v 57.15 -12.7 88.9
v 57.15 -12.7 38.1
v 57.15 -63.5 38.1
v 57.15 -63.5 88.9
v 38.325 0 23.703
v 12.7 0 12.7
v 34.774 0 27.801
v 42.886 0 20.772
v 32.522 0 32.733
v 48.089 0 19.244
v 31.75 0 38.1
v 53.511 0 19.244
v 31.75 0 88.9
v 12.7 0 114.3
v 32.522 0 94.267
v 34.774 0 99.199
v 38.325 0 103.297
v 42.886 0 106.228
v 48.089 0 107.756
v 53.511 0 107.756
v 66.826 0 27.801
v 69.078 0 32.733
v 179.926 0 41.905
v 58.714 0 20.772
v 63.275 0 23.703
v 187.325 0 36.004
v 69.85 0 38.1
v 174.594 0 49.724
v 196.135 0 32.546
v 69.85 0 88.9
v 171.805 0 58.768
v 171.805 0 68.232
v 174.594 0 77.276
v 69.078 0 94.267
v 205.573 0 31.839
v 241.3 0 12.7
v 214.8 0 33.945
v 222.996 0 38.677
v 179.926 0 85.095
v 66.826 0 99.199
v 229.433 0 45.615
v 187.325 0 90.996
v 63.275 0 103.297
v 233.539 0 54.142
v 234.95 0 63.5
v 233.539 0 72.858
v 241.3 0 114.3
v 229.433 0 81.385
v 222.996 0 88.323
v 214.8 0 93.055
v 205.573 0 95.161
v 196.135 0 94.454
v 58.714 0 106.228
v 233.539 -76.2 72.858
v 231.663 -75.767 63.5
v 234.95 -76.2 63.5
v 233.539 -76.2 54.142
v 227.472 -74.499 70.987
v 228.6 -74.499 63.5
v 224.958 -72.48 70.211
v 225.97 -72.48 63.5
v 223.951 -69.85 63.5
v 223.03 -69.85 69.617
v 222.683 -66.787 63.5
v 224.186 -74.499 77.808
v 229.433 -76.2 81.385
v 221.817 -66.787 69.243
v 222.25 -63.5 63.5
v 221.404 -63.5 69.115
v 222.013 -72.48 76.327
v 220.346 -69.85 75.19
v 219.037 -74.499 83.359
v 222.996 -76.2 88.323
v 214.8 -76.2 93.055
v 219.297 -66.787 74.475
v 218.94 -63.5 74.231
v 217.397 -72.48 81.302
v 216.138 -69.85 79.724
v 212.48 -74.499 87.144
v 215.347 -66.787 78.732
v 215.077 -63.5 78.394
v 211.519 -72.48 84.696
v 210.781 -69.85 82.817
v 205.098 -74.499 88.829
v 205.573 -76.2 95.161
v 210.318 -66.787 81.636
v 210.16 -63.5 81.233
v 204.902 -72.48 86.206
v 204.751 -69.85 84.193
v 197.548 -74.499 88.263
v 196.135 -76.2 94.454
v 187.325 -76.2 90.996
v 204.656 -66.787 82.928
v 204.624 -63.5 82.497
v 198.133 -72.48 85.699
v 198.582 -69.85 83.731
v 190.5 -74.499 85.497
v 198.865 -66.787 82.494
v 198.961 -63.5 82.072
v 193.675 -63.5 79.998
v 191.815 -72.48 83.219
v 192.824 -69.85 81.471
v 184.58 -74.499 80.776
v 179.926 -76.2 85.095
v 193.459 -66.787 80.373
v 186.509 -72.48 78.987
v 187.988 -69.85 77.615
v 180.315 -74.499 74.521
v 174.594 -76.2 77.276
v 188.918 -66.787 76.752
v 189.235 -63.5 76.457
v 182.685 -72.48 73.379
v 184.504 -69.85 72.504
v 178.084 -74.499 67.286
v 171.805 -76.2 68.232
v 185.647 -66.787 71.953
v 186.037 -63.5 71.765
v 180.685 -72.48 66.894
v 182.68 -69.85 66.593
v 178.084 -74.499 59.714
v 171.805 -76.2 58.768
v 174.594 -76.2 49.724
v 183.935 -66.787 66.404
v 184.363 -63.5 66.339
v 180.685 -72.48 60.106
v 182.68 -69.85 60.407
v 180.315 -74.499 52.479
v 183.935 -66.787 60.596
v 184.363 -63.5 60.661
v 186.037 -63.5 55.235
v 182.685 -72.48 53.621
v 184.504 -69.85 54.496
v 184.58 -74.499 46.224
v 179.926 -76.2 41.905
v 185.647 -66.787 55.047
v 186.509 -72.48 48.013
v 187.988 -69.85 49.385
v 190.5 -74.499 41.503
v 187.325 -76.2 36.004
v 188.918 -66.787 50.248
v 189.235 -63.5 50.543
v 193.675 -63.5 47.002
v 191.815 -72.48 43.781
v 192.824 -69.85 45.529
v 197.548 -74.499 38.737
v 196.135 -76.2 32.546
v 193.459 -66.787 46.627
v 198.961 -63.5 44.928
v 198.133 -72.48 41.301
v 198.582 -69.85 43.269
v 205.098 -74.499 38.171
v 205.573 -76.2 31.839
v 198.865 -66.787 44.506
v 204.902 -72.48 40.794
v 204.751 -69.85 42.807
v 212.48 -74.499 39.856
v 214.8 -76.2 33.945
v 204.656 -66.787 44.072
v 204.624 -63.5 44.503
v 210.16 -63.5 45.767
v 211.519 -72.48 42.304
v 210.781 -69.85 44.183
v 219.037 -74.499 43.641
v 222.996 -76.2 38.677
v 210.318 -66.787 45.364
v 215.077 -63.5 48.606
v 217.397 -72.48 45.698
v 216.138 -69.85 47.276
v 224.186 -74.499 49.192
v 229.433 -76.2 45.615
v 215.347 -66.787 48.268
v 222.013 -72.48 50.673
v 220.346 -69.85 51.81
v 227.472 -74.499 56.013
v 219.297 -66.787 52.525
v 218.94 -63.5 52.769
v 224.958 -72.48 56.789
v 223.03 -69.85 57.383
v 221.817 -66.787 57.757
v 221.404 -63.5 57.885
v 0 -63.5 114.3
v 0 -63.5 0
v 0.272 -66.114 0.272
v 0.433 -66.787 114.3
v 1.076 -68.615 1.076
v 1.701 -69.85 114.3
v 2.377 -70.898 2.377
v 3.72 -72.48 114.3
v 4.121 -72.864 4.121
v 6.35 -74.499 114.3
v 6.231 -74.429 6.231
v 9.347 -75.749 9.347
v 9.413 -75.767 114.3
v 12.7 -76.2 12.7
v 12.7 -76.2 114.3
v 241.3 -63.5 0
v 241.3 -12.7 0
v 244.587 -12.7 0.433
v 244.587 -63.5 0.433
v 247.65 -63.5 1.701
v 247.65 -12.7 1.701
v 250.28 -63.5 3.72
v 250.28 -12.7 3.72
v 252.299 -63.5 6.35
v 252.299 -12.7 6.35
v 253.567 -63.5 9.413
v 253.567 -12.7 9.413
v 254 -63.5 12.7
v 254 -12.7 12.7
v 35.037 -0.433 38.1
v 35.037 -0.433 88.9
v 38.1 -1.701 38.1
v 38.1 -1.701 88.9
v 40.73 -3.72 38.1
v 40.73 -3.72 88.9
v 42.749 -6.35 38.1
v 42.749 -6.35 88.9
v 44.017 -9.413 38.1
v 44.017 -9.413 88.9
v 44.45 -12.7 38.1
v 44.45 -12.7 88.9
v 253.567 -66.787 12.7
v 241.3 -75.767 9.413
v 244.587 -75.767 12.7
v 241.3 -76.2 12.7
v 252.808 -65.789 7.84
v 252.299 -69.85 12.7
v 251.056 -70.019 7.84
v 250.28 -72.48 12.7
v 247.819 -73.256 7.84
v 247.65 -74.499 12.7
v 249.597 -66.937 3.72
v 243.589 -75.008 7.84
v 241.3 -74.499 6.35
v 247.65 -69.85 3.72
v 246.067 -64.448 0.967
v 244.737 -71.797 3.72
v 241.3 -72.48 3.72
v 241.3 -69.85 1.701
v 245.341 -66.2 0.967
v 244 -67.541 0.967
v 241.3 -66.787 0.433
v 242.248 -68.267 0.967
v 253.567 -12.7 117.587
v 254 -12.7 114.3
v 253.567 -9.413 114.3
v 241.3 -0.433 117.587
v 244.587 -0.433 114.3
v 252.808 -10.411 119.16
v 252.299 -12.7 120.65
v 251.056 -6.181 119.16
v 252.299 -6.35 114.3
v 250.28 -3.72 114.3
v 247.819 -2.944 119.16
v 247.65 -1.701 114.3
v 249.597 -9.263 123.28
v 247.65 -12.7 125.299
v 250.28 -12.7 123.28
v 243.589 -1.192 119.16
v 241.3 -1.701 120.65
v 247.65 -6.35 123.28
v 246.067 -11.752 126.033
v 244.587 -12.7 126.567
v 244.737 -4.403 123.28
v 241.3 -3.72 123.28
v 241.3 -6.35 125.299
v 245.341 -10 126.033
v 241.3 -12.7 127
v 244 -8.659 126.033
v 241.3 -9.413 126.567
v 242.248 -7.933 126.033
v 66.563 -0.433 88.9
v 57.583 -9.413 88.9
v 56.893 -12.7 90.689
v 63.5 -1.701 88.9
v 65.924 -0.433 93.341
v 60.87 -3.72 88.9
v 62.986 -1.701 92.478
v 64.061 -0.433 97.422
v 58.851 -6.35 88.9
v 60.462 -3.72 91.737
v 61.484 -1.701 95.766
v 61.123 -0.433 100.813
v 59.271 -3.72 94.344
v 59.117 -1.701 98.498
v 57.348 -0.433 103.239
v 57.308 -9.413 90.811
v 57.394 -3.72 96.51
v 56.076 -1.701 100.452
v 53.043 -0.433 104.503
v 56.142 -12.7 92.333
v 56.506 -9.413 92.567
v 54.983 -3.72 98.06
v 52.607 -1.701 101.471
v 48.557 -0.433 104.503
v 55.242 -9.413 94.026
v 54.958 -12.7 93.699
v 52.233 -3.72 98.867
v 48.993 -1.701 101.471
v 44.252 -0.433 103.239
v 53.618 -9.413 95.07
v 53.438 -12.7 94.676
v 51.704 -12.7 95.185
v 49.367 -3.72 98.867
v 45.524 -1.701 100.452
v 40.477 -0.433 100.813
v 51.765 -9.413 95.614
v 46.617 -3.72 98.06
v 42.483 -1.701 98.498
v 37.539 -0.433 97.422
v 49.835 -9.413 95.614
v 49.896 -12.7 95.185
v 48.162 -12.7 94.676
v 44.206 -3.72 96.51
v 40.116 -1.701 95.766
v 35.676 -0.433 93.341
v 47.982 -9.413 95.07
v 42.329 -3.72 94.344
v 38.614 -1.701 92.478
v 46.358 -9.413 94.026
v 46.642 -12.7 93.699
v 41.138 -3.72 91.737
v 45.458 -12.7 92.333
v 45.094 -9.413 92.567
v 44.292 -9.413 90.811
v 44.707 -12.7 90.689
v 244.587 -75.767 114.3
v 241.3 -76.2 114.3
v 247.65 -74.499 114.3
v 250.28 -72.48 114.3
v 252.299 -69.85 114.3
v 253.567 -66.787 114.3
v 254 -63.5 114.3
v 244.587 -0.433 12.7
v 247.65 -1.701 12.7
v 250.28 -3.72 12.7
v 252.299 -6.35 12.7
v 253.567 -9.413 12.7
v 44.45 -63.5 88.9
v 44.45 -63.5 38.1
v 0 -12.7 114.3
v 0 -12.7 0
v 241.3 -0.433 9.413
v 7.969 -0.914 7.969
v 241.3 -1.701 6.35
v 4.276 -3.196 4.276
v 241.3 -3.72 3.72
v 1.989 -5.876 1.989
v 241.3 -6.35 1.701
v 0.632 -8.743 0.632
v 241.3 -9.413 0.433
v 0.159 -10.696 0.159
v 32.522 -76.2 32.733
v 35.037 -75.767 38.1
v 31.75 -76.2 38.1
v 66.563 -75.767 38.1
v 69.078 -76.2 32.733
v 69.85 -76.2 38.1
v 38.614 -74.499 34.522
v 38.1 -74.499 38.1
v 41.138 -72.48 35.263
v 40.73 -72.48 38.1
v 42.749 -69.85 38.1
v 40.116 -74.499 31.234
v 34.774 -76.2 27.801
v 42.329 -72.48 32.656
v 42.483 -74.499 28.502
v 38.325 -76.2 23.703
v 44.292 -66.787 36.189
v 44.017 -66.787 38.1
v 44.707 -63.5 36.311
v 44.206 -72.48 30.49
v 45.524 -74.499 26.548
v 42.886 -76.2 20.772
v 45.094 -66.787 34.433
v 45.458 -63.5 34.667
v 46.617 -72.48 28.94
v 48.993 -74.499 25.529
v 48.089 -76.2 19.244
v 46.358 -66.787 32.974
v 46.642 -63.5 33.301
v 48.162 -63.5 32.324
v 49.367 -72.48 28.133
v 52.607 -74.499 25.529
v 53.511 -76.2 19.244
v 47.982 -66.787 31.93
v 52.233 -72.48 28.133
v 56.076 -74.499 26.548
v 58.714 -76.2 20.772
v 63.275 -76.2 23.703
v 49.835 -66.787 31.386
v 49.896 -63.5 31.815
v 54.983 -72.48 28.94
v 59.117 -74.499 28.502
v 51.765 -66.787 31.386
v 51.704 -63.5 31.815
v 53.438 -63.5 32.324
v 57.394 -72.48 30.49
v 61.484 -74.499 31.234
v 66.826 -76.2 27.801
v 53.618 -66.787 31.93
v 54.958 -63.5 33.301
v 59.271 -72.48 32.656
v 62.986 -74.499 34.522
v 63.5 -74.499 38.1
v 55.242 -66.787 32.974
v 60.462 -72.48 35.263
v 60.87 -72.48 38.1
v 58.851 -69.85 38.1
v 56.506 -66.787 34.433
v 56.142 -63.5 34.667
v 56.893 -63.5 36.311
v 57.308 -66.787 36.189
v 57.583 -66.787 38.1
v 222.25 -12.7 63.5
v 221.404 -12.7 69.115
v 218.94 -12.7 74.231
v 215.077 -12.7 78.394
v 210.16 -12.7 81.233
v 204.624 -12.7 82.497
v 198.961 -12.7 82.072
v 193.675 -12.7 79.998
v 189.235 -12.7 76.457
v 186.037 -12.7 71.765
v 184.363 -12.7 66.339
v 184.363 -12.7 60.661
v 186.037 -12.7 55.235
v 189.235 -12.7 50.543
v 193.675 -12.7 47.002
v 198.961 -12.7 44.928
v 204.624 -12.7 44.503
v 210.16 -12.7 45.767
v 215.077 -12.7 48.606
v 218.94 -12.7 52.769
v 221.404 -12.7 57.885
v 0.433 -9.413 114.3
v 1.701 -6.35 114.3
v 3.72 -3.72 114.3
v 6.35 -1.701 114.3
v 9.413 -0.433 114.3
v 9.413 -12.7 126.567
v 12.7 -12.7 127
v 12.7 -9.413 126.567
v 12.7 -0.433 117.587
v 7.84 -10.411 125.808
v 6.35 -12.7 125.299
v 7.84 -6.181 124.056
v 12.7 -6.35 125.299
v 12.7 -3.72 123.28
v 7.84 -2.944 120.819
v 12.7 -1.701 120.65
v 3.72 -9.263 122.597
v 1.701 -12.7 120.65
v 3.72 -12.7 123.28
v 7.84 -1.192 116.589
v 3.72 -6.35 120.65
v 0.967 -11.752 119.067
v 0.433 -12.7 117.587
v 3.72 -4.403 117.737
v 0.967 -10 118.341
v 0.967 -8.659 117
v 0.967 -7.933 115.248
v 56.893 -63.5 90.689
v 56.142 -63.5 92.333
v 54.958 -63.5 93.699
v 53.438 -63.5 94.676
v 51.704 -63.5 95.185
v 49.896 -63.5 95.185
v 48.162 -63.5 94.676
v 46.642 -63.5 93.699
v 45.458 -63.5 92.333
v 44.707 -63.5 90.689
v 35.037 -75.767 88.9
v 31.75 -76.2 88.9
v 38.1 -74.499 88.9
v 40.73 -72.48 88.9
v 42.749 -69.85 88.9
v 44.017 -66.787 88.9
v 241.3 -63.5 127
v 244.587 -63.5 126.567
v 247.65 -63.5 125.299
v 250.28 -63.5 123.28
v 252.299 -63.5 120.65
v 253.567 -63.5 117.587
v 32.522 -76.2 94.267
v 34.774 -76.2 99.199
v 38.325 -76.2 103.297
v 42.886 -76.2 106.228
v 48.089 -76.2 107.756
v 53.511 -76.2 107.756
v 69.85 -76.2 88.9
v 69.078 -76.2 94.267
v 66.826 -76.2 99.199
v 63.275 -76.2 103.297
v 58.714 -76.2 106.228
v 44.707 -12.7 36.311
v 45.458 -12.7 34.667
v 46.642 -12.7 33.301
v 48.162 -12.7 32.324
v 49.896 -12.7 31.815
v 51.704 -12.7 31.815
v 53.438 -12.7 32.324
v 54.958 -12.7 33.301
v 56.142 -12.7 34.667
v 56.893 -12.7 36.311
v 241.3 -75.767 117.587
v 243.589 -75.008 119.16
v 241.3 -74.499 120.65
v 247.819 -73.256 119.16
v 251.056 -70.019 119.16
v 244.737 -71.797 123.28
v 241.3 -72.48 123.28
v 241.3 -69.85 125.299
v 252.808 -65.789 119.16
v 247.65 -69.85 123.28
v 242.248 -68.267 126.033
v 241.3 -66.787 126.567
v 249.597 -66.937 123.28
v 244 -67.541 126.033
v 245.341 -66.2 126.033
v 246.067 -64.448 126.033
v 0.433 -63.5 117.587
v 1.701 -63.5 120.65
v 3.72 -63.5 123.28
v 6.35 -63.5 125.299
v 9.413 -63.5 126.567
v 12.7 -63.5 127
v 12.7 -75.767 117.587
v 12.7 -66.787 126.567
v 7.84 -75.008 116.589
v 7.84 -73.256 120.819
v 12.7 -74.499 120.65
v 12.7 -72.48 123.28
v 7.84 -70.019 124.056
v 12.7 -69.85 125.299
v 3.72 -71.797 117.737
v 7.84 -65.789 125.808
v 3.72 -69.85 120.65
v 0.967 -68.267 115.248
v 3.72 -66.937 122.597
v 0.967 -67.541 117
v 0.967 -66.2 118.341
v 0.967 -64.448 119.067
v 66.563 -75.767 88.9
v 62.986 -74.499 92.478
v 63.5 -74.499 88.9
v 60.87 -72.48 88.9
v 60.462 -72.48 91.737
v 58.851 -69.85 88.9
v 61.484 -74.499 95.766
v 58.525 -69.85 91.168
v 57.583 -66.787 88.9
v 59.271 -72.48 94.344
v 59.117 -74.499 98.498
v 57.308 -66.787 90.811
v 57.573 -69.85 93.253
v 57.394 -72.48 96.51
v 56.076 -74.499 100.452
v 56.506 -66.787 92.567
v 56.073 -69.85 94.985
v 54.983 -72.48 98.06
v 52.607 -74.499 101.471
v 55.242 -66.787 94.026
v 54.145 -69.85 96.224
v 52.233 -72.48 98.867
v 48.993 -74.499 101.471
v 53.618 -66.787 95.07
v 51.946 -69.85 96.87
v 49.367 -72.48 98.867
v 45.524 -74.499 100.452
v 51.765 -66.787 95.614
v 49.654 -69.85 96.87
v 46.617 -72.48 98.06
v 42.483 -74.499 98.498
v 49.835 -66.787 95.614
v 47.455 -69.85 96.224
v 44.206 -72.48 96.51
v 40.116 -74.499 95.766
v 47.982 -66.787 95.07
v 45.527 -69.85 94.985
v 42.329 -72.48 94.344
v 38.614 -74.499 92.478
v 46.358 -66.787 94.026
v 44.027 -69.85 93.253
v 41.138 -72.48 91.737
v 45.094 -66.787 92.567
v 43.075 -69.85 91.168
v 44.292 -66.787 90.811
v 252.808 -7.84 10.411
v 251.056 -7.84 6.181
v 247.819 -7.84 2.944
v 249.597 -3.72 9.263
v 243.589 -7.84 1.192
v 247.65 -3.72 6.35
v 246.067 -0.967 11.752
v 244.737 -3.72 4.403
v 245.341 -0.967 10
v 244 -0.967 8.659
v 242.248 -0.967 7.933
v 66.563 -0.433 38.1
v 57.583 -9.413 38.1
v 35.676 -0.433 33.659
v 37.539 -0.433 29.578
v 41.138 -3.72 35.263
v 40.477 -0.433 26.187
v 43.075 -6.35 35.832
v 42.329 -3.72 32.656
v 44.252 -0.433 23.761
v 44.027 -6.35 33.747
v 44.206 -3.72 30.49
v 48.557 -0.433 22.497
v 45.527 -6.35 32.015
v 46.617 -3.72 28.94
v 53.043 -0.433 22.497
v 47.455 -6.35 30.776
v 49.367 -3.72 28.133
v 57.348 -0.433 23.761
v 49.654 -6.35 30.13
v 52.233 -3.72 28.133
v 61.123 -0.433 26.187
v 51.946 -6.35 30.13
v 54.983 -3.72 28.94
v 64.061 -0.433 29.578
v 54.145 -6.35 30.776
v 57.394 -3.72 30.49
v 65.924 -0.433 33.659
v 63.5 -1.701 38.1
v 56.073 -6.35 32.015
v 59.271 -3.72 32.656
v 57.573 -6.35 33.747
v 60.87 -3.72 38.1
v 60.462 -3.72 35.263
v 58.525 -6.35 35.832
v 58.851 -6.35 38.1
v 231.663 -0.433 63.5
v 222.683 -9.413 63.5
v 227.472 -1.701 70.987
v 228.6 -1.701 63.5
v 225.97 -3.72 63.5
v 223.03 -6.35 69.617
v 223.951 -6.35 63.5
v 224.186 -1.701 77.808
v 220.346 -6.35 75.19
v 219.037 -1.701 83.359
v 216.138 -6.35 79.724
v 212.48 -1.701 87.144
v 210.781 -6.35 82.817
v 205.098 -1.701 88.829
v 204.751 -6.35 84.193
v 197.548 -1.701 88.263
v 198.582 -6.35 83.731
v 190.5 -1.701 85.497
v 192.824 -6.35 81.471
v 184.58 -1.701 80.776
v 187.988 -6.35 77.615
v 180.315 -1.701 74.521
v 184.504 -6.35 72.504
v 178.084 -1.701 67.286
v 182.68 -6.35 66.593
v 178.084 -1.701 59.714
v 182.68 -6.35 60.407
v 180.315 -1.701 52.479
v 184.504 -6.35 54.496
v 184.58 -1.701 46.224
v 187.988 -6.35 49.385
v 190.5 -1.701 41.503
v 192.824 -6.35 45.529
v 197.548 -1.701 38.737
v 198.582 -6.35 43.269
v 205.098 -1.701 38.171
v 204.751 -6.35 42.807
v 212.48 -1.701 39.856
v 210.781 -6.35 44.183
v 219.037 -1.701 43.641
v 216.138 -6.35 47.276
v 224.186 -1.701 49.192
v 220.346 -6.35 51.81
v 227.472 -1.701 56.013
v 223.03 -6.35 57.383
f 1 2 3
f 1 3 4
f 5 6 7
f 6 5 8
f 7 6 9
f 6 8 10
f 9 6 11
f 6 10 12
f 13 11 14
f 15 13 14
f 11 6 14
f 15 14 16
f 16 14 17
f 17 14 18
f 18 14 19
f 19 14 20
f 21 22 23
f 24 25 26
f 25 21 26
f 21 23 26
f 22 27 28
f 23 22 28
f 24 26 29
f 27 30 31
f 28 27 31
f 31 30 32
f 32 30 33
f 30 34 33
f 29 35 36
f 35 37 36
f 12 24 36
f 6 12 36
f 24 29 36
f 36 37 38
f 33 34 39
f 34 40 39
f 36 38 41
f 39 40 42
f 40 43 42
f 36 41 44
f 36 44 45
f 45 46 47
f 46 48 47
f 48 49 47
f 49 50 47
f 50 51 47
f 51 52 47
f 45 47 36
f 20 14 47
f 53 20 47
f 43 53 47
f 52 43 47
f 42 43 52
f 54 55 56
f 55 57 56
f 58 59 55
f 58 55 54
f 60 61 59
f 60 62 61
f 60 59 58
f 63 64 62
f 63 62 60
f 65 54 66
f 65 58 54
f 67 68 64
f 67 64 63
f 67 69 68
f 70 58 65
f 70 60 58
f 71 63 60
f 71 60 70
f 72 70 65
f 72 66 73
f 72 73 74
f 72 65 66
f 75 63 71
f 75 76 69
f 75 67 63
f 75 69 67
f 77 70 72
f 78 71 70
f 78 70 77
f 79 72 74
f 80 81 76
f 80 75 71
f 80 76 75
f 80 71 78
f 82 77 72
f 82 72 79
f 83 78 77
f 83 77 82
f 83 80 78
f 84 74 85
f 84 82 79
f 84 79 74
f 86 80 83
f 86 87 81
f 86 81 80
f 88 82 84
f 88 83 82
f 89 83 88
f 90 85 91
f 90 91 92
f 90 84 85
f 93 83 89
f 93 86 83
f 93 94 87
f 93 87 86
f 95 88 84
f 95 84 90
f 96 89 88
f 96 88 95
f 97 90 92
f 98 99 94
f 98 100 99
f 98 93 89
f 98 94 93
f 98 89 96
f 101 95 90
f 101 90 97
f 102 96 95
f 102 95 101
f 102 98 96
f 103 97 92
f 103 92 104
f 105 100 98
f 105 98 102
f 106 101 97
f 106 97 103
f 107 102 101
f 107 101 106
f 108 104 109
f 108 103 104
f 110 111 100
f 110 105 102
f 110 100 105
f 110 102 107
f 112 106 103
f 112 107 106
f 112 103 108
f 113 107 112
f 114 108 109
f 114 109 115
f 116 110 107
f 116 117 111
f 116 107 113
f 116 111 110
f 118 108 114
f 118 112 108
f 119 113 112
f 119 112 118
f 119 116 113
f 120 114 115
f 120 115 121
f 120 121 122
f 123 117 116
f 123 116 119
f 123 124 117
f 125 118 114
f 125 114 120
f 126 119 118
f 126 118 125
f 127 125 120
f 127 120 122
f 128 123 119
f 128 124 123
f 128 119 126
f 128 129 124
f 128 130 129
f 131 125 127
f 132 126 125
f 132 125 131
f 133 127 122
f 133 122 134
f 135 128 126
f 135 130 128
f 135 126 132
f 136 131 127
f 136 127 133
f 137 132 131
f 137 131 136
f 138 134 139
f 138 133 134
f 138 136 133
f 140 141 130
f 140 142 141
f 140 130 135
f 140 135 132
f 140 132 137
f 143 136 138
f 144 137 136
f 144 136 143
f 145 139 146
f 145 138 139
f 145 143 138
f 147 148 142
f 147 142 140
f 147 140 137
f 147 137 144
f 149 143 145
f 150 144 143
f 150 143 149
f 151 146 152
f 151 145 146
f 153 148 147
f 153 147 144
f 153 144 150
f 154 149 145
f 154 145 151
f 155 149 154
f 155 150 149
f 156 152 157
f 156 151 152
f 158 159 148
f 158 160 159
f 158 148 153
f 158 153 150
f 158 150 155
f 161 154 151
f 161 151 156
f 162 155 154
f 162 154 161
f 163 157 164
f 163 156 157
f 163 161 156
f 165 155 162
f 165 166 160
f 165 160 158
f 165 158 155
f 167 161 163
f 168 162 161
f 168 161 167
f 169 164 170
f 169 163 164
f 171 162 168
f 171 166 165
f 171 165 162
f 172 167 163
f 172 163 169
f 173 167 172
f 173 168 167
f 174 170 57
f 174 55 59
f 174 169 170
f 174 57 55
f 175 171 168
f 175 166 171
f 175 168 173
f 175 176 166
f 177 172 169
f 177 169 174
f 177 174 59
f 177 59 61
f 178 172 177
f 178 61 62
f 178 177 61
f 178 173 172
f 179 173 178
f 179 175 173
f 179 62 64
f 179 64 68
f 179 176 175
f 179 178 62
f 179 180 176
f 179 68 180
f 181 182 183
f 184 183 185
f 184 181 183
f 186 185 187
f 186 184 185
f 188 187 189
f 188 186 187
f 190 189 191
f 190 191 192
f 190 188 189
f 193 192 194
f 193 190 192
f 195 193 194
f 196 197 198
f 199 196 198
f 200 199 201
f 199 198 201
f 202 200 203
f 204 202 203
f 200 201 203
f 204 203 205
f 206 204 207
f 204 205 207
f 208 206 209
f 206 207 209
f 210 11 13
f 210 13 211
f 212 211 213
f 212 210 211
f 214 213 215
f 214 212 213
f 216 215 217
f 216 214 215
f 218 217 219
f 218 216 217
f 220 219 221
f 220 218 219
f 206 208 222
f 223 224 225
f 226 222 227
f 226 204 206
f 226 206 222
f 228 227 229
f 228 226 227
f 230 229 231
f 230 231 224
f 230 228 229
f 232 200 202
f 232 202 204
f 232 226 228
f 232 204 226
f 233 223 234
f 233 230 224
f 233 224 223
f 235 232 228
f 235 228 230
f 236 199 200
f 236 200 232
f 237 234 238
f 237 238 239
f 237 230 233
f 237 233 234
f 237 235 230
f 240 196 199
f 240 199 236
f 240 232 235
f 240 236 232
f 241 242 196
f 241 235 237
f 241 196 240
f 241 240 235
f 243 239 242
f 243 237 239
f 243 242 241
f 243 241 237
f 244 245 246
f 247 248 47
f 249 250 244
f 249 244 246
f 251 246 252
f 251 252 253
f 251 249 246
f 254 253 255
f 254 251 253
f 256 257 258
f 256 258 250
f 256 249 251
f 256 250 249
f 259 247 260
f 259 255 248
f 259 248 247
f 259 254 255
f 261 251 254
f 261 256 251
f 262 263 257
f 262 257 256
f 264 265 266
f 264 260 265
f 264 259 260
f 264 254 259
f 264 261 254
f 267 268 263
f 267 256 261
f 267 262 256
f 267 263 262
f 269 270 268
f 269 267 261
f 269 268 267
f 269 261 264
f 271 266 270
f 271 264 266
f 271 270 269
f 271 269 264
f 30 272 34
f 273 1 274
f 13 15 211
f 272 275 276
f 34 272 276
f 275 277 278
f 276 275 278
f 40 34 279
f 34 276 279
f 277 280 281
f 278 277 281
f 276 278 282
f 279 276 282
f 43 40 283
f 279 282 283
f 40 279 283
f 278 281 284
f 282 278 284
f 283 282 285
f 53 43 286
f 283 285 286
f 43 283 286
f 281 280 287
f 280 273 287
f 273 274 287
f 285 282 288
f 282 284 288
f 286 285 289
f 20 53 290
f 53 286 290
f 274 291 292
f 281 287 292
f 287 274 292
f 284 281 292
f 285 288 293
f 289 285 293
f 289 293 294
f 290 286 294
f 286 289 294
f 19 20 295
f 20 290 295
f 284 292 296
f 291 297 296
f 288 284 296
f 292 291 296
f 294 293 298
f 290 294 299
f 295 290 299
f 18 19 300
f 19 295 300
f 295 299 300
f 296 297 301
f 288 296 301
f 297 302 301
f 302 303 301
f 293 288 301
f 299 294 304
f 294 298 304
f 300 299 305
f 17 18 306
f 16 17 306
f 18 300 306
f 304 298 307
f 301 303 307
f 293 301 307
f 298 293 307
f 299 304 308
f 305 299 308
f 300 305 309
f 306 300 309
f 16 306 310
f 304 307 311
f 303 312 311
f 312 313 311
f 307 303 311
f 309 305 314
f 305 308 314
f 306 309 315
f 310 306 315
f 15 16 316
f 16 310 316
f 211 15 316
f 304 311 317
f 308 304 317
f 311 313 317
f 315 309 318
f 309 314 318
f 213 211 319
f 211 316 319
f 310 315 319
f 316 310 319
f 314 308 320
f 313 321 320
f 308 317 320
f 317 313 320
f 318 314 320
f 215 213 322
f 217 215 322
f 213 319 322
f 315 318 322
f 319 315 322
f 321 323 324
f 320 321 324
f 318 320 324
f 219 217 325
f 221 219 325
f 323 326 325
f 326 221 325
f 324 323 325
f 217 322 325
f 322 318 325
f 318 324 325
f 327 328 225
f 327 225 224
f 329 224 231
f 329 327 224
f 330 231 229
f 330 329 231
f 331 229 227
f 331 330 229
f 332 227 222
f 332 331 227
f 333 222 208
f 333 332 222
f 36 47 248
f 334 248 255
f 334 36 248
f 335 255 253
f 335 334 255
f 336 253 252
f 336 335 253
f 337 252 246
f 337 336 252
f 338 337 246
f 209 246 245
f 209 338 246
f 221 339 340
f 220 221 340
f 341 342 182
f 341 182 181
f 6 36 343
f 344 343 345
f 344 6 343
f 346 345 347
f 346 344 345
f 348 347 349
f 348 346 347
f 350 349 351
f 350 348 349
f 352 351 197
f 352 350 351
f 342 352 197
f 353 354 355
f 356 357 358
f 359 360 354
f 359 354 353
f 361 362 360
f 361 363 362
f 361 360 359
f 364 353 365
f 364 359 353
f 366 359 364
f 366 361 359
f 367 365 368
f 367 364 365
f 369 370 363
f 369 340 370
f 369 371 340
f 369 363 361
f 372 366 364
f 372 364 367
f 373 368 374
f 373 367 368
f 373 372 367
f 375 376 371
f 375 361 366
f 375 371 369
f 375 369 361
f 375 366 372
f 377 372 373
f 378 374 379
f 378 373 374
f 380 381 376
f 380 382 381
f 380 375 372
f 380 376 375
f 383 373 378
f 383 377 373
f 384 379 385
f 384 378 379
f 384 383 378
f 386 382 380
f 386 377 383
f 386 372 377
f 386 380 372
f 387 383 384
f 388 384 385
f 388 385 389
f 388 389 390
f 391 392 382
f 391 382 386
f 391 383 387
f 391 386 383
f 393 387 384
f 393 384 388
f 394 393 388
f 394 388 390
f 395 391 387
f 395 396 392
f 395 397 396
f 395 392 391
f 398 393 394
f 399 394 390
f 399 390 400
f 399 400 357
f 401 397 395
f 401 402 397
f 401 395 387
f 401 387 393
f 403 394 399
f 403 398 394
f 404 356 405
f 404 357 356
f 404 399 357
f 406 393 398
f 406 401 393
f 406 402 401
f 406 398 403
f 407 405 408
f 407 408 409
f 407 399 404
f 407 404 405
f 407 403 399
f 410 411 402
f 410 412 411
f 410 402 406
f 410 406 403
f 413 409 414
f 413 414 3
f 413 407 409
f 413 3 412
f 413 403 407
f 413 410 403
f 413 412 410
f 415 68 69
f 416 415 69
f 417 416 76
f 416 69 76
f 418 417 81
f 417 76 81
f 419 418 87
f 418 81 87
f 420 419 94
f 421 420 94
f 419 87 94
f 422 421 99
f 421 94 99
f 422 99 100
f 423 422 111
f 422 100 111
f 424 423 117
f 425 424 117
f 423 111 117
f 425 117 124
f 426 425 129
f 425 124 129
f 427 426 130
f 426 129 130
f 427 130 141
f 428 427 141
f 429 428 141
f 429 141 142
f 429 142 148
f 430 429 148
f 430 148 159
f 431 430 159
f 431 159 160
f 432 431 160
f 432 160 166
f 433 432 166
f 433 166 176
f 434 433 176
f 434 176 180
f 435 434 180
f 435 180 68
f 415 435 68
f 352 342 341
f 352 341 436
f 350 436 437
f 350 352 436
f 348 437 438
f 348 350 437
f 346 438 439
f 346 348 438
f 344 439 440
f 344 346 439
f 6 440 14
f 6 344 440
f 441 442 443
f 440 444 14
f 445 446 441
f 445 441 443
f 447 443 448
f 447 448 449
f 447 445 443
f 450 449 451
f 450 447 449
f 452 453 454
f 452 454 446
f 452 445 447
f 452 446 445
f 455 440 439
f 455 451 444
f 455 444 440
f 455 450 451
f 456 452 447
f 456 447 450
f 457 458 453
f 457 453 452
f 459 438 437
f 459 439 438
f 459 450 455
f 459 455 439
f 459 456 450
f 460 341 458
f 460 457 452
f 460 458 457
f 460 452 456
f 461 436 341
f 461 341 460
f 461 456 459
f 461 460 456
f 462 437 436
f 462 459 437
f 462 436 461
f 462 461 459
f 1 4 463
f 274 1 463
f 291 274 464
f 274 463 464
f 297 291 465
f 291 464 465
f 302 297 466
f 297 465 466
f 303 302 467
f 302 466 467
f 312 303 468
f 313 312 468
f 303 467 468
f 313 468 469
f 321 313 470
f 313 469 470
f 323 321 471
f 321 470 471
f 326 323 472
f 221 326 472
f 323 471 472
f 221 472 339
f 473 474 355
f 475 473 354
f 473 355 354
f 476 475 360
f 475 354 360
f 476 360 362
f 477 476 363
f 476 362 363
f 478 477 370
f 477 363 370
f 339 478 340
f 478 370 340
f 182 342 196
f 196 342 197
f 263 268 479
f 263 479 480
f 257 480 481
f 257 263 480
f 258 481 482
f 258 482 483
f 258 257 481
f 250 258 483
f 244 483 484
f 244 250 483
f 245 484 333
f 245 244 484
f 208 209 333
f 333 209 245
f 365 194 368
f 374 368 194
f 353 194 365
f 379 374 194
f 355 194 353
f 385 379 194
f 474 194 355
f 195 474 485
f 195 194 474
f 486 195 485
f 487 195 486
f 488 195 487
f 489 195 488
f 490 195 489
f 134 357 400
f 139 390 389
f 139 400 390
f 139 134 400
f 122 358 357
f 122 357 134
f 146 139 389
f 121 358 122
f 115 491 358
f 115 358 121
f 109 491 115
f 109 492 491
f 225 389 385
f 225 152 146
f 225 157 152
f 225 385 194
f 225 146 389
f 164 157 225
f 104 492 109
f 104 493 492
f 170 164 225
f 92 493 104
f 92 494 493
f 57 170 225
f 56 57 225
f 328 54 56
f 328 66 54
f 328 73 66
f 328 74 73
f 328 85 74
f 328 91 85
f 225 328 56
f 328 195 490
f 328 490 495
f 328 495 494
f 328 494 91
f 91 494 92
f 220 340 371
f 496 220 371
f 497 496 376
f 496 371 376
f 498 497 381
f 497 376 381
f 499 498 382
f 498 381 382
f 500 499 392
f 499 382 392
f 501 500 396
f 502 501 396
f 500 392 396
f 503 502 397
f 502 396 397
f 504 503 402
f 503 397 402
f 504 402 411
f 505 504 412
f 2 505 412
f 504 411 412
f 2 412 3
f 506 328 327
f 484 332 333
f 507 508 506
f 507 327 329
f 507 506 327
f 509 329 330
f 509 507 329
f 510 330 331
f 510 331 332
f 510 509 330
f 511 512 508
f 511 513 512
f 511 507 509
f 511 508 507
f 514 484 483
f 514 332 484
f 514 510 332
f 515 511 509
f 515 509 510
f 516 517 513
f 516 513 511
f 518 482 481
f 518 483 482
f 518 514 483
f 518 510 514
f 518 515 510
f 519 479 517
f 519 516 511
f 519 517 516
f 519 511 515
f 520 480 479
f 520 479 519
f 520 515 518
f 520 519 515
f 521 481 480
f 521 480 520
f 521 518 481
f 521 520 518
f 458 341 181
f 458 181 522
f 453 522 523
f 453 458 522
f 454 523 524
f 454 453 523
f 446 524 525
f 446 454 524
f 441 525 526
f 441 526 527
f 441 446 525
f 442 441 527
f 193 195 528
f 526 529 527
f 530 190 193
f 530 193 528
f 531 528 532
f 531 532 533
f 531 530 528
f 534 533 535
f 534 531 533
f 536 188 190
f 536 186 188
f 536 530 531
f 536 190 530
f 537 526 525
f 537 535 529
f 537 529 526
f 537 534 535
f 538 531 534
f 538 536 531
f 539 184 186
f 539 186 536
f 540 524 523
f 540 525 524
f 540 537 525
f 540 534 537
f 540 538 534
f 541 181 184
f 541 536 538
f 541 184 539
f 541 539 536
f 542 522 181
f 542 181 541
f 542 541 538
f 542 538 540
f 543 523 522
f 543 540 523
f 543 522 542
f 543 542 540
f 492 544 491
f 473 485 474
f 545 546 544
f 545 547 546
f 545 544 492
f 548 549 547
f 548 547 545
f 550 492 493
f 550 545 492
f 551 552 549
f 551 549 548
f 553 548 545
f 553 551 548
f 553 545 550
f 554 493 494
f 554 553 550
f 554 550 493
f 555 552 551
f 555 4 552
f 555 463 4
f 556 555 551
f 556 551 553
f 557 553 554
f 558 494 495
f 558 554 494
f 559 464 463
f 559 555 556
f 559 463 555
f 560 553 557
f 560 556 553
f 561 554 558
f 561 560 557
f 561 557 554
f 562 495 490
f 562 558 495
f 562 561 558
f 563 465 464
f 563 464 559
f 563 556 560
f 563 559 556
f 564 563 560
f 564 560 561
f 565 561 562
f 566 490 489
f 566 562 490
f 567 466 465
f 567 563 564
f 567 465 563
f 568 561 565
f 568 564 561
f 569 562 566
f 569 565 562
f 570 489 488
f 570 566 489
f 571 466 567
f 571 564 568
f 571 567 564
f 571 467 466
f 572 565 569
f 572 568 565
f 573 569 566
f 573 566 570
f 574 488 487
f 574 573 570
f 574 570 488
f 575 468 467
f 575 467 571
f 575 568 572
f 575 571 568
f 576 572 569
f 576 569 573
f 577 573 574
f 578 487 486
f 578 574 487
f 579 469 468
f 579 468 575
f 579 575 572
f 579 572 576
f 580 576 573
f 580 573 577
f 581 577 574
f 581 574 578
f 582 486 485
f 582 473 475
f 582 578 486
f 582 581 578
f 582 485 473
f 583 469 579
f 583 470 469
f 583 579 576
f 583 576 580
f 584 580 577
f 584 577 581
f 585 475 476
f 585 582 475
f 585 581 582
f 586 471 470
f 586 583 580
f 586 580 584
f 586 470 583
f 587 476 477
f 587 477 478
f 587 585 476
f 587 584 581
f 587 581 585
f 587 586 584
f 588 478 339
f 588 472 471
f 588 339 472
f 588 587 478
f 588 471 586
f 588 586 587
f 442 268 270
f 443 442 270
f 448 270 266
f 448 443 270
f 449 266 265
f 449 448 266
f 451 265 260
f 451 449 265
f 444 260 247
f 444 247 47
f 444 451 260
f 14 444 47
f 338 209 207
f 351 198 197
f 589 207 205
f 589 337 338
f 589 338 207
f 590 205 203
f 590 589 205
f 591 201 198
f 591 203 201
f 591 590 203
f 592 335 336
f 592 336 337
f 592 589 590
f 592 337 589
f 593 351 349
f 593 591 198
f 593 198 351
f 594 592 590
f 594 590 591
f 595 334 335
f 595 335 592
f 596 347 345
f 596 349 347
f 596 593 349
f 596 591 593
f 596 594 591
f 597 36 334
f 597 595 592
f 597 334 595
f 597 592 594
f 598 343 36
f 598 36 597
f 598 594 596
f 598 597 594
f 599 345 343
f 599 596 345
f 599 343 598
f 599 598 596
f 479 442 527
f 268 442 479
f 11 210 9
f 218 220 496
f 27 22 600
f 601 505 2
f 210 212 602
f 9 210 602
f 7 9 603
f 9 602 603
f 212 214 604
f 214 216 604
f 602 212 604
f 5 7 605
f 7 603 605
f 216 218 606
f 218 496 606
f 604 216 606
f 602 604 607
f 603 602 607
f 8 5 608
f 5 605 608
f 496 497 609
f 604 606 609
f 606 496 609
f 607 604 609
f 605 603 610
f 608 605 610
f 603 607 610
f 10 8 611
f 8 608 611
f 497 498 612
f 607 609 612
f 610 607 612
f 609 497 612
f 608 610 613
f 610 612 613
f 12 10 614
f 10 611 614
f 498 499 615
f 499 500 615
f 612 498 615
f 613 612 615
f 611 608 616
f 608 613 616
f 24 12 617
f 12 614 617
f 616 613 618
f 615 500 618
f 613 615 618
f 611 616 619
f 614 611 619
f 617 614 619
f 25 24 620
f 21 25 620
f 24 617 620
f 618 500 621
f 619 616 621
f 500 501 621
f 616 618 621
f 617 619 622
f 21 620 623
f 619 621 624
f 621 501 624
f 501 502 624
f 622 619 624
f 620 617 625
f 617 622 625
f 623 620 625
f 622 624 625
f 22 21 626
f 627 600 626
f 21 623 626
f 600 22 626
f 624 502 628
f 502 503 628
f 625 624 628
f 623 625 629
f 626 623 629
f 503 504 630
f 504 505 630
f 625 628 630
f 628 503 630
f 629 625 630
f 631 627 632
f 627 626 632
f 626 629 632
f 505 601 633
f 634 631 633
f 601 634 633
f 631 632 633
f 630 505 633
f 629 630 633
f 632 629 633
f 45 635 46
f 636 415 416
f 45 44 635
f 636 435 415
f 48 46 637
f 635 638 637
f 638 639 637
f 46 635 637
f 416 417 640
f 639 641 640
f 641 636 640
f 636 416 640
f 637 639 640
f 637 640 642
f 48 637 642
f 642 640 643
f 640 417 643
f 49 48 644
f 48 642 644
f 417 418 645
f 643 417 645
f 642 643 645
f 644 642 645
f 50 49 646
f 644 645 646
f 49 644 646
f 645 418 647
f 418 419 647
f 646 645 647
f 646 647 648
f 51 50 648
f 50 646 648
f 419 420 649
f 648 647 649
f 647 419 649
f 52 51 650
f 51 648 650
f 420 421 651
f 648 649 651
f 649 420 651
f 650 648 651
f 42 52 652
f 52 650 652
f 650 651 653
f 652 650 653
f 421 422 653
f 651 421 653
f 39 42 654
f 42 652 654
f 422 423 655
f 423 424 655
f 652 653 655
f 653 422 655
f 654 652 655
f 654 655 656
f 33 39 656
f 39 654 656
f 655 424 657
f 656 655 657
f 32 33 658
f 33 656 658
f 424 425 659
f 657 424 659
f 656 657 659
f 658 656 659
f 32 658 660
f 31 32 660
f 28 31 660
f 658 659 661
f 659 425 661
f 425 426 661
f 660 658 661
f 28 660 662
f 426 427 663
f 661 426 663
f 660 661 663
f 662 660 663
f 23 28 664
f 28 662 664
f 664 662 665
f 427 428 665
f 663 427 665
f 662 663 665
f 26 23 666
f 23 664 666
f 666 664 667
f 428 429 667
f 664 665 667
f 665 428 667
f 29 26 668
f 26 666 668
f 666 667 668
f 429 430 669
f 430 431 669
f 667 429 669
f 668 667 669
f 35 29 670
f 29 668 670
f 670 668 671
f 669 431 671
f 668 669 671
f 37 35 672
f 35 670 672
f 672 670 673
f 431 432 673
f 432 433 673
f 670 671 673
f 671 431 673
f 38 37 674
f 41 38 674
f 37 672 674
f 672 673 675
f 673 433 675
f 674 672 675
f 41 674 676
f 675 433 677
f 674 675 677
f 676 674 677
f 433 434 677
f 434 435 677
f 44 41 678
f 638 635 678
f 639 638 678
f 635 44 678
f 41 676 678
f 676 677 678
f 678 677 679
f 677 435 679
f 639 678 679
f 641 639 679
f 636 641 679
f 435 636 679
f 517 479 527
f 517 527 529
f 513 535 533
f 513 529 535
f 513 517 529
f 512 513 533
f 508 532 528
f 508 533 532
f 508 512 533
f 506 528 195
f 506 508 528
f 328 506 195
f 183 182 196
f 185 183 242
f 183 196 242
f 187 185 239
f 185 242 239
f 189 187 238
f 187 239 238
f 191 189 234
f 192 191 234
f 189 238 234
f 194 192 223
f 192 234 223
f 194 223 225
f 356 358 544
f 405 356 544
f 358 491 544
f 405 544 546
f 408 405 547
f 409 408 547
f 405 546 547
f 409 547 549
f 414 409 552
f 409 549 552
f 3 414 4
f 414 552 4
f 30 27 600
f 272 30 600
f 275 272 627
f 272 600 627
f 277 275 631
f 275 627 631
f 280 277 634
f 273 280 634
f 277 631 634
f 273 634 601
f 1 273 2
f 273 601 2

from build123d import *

# Parameters (mm, degrees)
F0_W         = 254
F0_H         = 127
F1_DEPTH     = 76.2
F2_R         = 19.05
F3_DEPTH     = 76.201
F5_DEPTH     = 76.201
F6_R         = 12.7
F7_T1_DEPTH  = 228.6
F7_T3_DEPTH  = 50.8
F7_T5_DEPTH  = 101.6
F7_T7_DEPTH  = 273.05
F7_T9_DEPTH  = 146.05
F7_T11_DEPTH = 50.8
F7_S15_W     = 12.7
F7_S15_H     = 12.7
F7_T16_DEPTH = 12.7
F7_S21_W     = 12.7
F7_S21_H     = 12.7
F7_T22_DEPTH = 12.7
F7_S27_W     = 12.7
F7_S27_H     = 12.7
F7_T28_DEPTH = 12.7
F7_S33_W     = 12.7
F7_S33_H     = 12.7
F7_T34_DEPTH = 12.7
F7_S39_W     = 12.7
F7_S39_H     = 12.7
F7_T40_DEPTH = 12.7
F7_S45_W     = 12.7
F7_S45_H     = 12.7
F7_T46_DEPTH = 12.7
F7_T50_ANGLE = 180
F7_T52_ANGLE = 180


# Not quite as in the source:
# - a fillet or chamfer that OpenCascade refuses, or shapes differently, is made with other operations: its cross-section is extruded or revolved along the edge and cut away or added


with BuildPart() as f1:
    # F0 (on Front) → F1 (new body)
    with BuildSketch(Plane.XZ):
        with Locations((127, 63.5)):
            Rectangle(F0_W, F0_H)
    extrude(amount=F1_DEPTH)

    # F2 (on face) → F3 (cut, through all)
    with BuildSketch(Plane.XZ.offset(76.2)):
        with Locations((203.2, 63.5)):
            Circle(F2_R)
    extrude(amount=-F3_DEPTH, mode=Mode.SUBTRACT)

    # F4 (on face) → F5 (cut, through all)
    with BuildSketch(Plane.XZ.offset(76.2)):
        with BuildLine():
            Line((57.15, 38.1), (57.15, 88.9))
            ThreePointArc((57.15, 88.9), (50.8, 95.25), (44.45, 88.9))
            Line((44.45, 88.9), (44.45, 38.1))
            ThreePointArc((44.45, 38.1), (50.8, 31.75), (57.15, 38.1))
        make_face()
    extrude(amount=-F5_DEPTH, mode=Mode.SUBTRACT)

    # F6
    f6_edges = [f1.edges().sort_by_distance(p)[0] for p in [
        (0, -76.2, 63.5),
        (127, -76.2, 127),
        (127, -76.2, 0),
        (254, -76.2, 63.5),
        (57.15, -76.2, 63.5),
        (50.8, -76.2, 95.25),
        (44.45, -76.2, 63.5),
        (50.8, -76.2, 31.75),
        (184.15, -76.2, 63.5),
    ]]
    fillet(f6_edges, radius=F6_R)

    # F7: fillet of radius 12.7 on 12 edges, made by hand

    # F7_s2 → F7_t1 (cut)
    with BuildSketch(Plane.YZ.offset(12.7)):
        with BuildLine():
            ThreePointArc((-12.7, 127), (-3.7197438789, 123.2802561211), (0, 114.3))
            Line((0, 114.3), (0, 127))
            Line((0, 127), (-12.7, 127))
        make_face()
    extrude(amount=F7_T1_DEPTH, mode=Mode.SUBTRACT)

    # F7_s4 → F7_t3 (cut)
    with BuildSketch(Plane.XZ.offset(12.7)):
        with BuildLine():
            ThreePointArc((0, 114.3), (3.7197438789, 123.2802561211), (12.7, 127))
            Line((12.7, 127), (0, 127))
            Line((0, 127), (0, 114.3))
        make_face()
        with BuildLine():
            ThreePointArc((241.3, 127), (250.2802561211, 123.2802561211), (254, 114.3))
            Line((254, 114.3), (254, 127))
            Line((254, 127), (241.3, 127))
        make_face()
        with BuildLine():
            ThreePointArc((241.3, 0), (250.2802561211, 3.7197438789), (254, 12.7))
            Line((254, 12.7), (254, 0))
            Line((254, 0), (241.3, 0))
        make_face()
    extrude(amount=F7_T3_DEPTH, mode=Mode.SUBTRACT)

    # F7_s6 → F7_t5 (cut)
    with BuildSketch(Plane.XY.offset(12.7)):
        with BuildLine():
            ThreePointArc((241.3, 0), (250.2802561211, -3.7197438789), (254, -12.7))
            Line((254, -12.7), (254, 0))
            Line((254, 0), (241.3, 0))
        make_face()
    extrude(amount=F7_T5_DEPTH, mode=Mode.SUBTRACT)

    # F7_s8 → F7_t7 (cut)
    with BuildSketch(Plane.YZ.offset(-31.75)):
        with BuildLine():
            ThreePointArc((0, 12.7), (-3.7197438789, 3.7197438789), (-12.7, 0))
            Line((-12.7, 0), (0, 0))
            Line((0, 0), (0, 12.7))
        make_face()
    extrude(amount=F7_T7_DEPTH, mode=Mode.SUBTRACT)

    # F7_s10 → F7_t9 (cut)
    with BuildSketch(Plane.XY.offset(-31.75)):
        with BuildLine():
            ThreePointArc((0, -12.7), (3.7197438789, -3.7197438789), (12.7, 0))
            Line((12.7, 0), (0, 0))
            Line((0, 0), (0, -12.7))
        make_face()
    extrude(amount=F7_T9_DEPTH, mode=Mode.SUBTRACT)

    # F7_s12 → F7_t11 (cut)
    with BuildSketch(Plane.XY.offset(38.1)):
        with BuildLine():
            ThreePointArc((31.75, 0), (40.7302561211, -3.7197438789), (44.45, -12.7))
            Line((44.45, -12.7), (44.45, 0))
            Line((44.45, 0), (31.75, 0))
        make_face()
        with BuildLine():
            ThreePointArc((69.85, 0), (60.8697438789, -3.7197438789), (57.15, -12.7))
            Line((57.15, -12.7), (57.15, 0))
            Line((57.15, 0), (69.85, 0))
        make_face()
    extrude(amount=F7_T11_DEPTH, mode=Mode.SUBTRACT)


with BuildPart() as f7_tool14:
    # F7_s15 → F7_t16 (new body)
    with BuildSketch(Plane.XY.offset(12.7)):
        with Locations((247.65, -69.85)):
            Rectangle(F7_S15_W, F7_S15_H)
    extrude(amount=-F7_T16_DEPTH)

    # F7_s17 → F7_t18 (revolve, cut)
    with BuildSketch(Plane(origin=(241.3, -63.5, 12.7), x_dir=(-0.7071067812, 0.7071067812, 0), z_dir=(-0.7071067812, -0.7071067812, 0))):
        with BuildLine():
            ThreePointArc((0, -12.7), (12.7, 0), (0, 12.7))
            Line((0, 12.7), (0, -12.7))
        make_face()
    revolve(axis=Axis((241.3, -63.5, 12.7), (0, 0, -1)), mode=Mode.SUBTRACT)


with BuildPart() as f1_1:
    add(f1.part)

    # F7_t13: cut F7_tool14
    add(f7_tool14.part, mode=Mode.SUBTRACT)


with BuildPart() as f7_tool20:
    # F7_s21 → F7_t22 (new body)
    with BuildSketch(Plane.XY.offset(114.3)):
        with Locations((247.65, -69.85)):
            Rectangle(F7_S21_W, F7_S21_H)
    extrude(amount=F7_T22_DEPTH)

    # F7_s23 → F7_t24 (revolve, cut)
    with BuildSketch(Plane(origin=(241.3, -63.5, 114.3), x_dir=(-0.7071067812, 0.7071067812, 0), z_dir=(0.7071067812, 0.7071067812, 0))):
        with BuildLine():
            ThreePointArc((0, -12.7), (12.7, 0), (0, 12.7))
            Line((0, 12.7), (0, -12.7))
        make_face()
    revolve(axis=Axis((241.3, -63.5, 114.3), (0, 0, 1)), mode=Mode.SUBTRACT)


with BuildPart() as f1_2:
    add(f1_1.part)

    # F7_t19: cut F7_tool20
    add(f7_tool20.part, mode=Mode.SUBTRACT)


with BuildPart() as f7_tool26:
    # F7_s27 → F7_t28 (new body)
    with BuildSketch(Plane.YZ.offset(12.7)):
        with Locations((-69.85, 120.65)):
            Rectangle(F7_S27_W, F7_S27_H)
    extrude(amount=-F7_T28_DEPTH)

    # F7_s29 → F7_t30 (revolve, cut)
    with BuildSketch(Plane(origin=(12.7, -63.5, 114.3), x_dir=(0, 0.7071067812, -0.7071067812), z_dir=(0, 0.7071067812, 0.7071067812))):
        with BuildLine():
            ThreePointArc((0, -12.7), (12.7, 0), (0, 12.7))
            Line((0, 12.7), (0, -12.7))
        make_face()
    revolve(axis=Axis((12.7, -63.5, 114.3), (-1, 0, 0)), mode=Mode.SUBTRACT)


with BuildPart() as f1_3:
    add(f1_2.part)

    # F7_t25: cut F7_tool26
    add(f7_tool26.part, mode=Mode.SUBTRACT)


with BuildPart() as f7_tool32:
    # F7_s33 → F7_t34 (new body)
    with BuildSketch(Plane.XY.offset(114.3)):
        with Locations((247.65, -6.35)):
            Rectangle(F7_S33_W, F7_S33_H)
    extrude(amount=F7_T34_DEPTH)

    # F7_s35 → F7_t36 (revolve, cut)
    with BuildSketch(Plane(origin=(241.3, -12.7, 114.3), x_dir=(-0.7071067812, -0.7071067812, 0), z_dir=(-0.7071067812, 0.7071067812, 0))):
        with BuildLine():
            ThreePointArc((0, -12.7), (12.7, 0), (0, 12.7))
            Line((0, 12.7), (0, -12.7))
        make_face()
    revolve(axis=Axis((241.3, -12.7, 114.3), (0, 0, 1)), mode=Mode.SUBTRACT)


with BuildPart() as f1_4:
    add(f1_3.part)

    # F7_t31: cut F7_tool32
    add(f7_tool32.part, mode=Mode.SUBTRACT)


with BuildPart() as f7_tool38:
    # F7_s39 → F7_t40 (new body)
    with BuildSketch(Plane.YZ.offset(12.7)):
        with Locations((-6.35, 120.65)):
            Rectangle(F7_S39_W, F7_S39_H)
    extrude(amount=-F7_T40_DEPTH)

    # F7_s41 → F7_t42 (revolve, cut)
    with BuildSketch(Plane(origin=(12.7, -12.7, 114.3), x_dir=(0, -0.7071067812, -0.7071067812), z_dir=(0, 0.7071067812, -0.7071067812))):
        with BuildLine():
            ThreePointArc((0, -12.7), (12.7, 0), (0, 12.7))
            Line((0, 12.7), (0, -12.7))
        make_face()
    revolve(axis=Axis((12.7, -12.7, 114.3), (-1, 0, 0)), mode=Mode.SUBTRACT)


with BuildPart() as f1_5:
    add(f1_4.part)

    # F7_t37: cut F7_tool38
    add(f7_tool38.part, mode=Mode.SUBTRACT)


with BuildPart() as f7_tool44:
    # F7_s45 → F7_t46 (new body)
    with BuildSketch(Plane.XZ.offset(12.7)):
        with Locations((247.65, 6.35)):
            Rectangle(F7_S45_W, F7_S45_H)
    extrude(amount=-F7_T46_DEPTH)

    # F7_s47 → F7_t48 (revolve, cut)
    with BuildSketch(Plane(origin=(241.3, -12.7, 12.7), x_dir=(-0.7071067812, 0, 0.7071067812), z_dir=(-0.7071067812, 0, -0.7071067812))):
        with BuildLine():
            ThreePointArc((0, -12.7), (12.7, 0), (0, 12.7))
            Line((0, 12.7), (0, -12.7))
        make_face()
    revolve(axis=Axis((241.3, -12.7, 12.7), (0, 1, 0)), mode=Mode.SUBTRACT)


with BuildPart() as f1_6:
    add(f1_5.part)

    # F7_t43: cut F7_tool44
    add(f7_tool44.part, mode=Mode.SUBTRACT)

    # F7_s49 → F7_t50 (revolve, cut)
    with BuildSketch(Plane.XY.offset(38.1)):
        with BuildLine():
            ThreePointArc((31.75, 0), (40.7302561211, -3.7197438789), (44.45, -12.7))
            Line((44.45, -12.7), (44.45, 0))
            Line((44.45, 0), (31.75, 0))
        make_face()
    revolve(axis=Axis((50.8, 0, 38.1), (0, -1, 0)), revolution_arc=F7_T50_ANGLE, mode=Mode.SUBTRACT)

    # F7_s51 → F7_t52 (revolve, cut)
    with BuildSketch(Plane.XY.offset(88.9)):
        with BuildLine():
            ThreePointArc((69.85, 0), (60.8697438789, -3.7197438789), (57.15, -12.7))
            Line((57.15, -12.7), (57.15, 0))
            Line((57.15, 0), (69.85, 0))
        make_face()
    revolve(axis=Axis((50.8, 0, 88.9), (0, -1, 0)), revolution_arc=F7_T52_ANGLE, mode=Mode.SUBTRACT)

    # F7_s53 → F7_t54 (revolve, cut)
    with BuildSketch(Plane.XY.offset(63.5)):
        with BuildLine():
            ThreePointArc((234.95, 0), (225.9697438789, -3.7197438789), (222.25, -12.7))
            Line((222.25, -12.7), (222.25, 0))
            Line((222.25, 0), (234.95, 0))
        make_face()
    revolve(axis=Axis((203.2, 0, 63.5), (0, -1, 0)), mode=Mode.SUBTRACT)


solid = f1_6.part
